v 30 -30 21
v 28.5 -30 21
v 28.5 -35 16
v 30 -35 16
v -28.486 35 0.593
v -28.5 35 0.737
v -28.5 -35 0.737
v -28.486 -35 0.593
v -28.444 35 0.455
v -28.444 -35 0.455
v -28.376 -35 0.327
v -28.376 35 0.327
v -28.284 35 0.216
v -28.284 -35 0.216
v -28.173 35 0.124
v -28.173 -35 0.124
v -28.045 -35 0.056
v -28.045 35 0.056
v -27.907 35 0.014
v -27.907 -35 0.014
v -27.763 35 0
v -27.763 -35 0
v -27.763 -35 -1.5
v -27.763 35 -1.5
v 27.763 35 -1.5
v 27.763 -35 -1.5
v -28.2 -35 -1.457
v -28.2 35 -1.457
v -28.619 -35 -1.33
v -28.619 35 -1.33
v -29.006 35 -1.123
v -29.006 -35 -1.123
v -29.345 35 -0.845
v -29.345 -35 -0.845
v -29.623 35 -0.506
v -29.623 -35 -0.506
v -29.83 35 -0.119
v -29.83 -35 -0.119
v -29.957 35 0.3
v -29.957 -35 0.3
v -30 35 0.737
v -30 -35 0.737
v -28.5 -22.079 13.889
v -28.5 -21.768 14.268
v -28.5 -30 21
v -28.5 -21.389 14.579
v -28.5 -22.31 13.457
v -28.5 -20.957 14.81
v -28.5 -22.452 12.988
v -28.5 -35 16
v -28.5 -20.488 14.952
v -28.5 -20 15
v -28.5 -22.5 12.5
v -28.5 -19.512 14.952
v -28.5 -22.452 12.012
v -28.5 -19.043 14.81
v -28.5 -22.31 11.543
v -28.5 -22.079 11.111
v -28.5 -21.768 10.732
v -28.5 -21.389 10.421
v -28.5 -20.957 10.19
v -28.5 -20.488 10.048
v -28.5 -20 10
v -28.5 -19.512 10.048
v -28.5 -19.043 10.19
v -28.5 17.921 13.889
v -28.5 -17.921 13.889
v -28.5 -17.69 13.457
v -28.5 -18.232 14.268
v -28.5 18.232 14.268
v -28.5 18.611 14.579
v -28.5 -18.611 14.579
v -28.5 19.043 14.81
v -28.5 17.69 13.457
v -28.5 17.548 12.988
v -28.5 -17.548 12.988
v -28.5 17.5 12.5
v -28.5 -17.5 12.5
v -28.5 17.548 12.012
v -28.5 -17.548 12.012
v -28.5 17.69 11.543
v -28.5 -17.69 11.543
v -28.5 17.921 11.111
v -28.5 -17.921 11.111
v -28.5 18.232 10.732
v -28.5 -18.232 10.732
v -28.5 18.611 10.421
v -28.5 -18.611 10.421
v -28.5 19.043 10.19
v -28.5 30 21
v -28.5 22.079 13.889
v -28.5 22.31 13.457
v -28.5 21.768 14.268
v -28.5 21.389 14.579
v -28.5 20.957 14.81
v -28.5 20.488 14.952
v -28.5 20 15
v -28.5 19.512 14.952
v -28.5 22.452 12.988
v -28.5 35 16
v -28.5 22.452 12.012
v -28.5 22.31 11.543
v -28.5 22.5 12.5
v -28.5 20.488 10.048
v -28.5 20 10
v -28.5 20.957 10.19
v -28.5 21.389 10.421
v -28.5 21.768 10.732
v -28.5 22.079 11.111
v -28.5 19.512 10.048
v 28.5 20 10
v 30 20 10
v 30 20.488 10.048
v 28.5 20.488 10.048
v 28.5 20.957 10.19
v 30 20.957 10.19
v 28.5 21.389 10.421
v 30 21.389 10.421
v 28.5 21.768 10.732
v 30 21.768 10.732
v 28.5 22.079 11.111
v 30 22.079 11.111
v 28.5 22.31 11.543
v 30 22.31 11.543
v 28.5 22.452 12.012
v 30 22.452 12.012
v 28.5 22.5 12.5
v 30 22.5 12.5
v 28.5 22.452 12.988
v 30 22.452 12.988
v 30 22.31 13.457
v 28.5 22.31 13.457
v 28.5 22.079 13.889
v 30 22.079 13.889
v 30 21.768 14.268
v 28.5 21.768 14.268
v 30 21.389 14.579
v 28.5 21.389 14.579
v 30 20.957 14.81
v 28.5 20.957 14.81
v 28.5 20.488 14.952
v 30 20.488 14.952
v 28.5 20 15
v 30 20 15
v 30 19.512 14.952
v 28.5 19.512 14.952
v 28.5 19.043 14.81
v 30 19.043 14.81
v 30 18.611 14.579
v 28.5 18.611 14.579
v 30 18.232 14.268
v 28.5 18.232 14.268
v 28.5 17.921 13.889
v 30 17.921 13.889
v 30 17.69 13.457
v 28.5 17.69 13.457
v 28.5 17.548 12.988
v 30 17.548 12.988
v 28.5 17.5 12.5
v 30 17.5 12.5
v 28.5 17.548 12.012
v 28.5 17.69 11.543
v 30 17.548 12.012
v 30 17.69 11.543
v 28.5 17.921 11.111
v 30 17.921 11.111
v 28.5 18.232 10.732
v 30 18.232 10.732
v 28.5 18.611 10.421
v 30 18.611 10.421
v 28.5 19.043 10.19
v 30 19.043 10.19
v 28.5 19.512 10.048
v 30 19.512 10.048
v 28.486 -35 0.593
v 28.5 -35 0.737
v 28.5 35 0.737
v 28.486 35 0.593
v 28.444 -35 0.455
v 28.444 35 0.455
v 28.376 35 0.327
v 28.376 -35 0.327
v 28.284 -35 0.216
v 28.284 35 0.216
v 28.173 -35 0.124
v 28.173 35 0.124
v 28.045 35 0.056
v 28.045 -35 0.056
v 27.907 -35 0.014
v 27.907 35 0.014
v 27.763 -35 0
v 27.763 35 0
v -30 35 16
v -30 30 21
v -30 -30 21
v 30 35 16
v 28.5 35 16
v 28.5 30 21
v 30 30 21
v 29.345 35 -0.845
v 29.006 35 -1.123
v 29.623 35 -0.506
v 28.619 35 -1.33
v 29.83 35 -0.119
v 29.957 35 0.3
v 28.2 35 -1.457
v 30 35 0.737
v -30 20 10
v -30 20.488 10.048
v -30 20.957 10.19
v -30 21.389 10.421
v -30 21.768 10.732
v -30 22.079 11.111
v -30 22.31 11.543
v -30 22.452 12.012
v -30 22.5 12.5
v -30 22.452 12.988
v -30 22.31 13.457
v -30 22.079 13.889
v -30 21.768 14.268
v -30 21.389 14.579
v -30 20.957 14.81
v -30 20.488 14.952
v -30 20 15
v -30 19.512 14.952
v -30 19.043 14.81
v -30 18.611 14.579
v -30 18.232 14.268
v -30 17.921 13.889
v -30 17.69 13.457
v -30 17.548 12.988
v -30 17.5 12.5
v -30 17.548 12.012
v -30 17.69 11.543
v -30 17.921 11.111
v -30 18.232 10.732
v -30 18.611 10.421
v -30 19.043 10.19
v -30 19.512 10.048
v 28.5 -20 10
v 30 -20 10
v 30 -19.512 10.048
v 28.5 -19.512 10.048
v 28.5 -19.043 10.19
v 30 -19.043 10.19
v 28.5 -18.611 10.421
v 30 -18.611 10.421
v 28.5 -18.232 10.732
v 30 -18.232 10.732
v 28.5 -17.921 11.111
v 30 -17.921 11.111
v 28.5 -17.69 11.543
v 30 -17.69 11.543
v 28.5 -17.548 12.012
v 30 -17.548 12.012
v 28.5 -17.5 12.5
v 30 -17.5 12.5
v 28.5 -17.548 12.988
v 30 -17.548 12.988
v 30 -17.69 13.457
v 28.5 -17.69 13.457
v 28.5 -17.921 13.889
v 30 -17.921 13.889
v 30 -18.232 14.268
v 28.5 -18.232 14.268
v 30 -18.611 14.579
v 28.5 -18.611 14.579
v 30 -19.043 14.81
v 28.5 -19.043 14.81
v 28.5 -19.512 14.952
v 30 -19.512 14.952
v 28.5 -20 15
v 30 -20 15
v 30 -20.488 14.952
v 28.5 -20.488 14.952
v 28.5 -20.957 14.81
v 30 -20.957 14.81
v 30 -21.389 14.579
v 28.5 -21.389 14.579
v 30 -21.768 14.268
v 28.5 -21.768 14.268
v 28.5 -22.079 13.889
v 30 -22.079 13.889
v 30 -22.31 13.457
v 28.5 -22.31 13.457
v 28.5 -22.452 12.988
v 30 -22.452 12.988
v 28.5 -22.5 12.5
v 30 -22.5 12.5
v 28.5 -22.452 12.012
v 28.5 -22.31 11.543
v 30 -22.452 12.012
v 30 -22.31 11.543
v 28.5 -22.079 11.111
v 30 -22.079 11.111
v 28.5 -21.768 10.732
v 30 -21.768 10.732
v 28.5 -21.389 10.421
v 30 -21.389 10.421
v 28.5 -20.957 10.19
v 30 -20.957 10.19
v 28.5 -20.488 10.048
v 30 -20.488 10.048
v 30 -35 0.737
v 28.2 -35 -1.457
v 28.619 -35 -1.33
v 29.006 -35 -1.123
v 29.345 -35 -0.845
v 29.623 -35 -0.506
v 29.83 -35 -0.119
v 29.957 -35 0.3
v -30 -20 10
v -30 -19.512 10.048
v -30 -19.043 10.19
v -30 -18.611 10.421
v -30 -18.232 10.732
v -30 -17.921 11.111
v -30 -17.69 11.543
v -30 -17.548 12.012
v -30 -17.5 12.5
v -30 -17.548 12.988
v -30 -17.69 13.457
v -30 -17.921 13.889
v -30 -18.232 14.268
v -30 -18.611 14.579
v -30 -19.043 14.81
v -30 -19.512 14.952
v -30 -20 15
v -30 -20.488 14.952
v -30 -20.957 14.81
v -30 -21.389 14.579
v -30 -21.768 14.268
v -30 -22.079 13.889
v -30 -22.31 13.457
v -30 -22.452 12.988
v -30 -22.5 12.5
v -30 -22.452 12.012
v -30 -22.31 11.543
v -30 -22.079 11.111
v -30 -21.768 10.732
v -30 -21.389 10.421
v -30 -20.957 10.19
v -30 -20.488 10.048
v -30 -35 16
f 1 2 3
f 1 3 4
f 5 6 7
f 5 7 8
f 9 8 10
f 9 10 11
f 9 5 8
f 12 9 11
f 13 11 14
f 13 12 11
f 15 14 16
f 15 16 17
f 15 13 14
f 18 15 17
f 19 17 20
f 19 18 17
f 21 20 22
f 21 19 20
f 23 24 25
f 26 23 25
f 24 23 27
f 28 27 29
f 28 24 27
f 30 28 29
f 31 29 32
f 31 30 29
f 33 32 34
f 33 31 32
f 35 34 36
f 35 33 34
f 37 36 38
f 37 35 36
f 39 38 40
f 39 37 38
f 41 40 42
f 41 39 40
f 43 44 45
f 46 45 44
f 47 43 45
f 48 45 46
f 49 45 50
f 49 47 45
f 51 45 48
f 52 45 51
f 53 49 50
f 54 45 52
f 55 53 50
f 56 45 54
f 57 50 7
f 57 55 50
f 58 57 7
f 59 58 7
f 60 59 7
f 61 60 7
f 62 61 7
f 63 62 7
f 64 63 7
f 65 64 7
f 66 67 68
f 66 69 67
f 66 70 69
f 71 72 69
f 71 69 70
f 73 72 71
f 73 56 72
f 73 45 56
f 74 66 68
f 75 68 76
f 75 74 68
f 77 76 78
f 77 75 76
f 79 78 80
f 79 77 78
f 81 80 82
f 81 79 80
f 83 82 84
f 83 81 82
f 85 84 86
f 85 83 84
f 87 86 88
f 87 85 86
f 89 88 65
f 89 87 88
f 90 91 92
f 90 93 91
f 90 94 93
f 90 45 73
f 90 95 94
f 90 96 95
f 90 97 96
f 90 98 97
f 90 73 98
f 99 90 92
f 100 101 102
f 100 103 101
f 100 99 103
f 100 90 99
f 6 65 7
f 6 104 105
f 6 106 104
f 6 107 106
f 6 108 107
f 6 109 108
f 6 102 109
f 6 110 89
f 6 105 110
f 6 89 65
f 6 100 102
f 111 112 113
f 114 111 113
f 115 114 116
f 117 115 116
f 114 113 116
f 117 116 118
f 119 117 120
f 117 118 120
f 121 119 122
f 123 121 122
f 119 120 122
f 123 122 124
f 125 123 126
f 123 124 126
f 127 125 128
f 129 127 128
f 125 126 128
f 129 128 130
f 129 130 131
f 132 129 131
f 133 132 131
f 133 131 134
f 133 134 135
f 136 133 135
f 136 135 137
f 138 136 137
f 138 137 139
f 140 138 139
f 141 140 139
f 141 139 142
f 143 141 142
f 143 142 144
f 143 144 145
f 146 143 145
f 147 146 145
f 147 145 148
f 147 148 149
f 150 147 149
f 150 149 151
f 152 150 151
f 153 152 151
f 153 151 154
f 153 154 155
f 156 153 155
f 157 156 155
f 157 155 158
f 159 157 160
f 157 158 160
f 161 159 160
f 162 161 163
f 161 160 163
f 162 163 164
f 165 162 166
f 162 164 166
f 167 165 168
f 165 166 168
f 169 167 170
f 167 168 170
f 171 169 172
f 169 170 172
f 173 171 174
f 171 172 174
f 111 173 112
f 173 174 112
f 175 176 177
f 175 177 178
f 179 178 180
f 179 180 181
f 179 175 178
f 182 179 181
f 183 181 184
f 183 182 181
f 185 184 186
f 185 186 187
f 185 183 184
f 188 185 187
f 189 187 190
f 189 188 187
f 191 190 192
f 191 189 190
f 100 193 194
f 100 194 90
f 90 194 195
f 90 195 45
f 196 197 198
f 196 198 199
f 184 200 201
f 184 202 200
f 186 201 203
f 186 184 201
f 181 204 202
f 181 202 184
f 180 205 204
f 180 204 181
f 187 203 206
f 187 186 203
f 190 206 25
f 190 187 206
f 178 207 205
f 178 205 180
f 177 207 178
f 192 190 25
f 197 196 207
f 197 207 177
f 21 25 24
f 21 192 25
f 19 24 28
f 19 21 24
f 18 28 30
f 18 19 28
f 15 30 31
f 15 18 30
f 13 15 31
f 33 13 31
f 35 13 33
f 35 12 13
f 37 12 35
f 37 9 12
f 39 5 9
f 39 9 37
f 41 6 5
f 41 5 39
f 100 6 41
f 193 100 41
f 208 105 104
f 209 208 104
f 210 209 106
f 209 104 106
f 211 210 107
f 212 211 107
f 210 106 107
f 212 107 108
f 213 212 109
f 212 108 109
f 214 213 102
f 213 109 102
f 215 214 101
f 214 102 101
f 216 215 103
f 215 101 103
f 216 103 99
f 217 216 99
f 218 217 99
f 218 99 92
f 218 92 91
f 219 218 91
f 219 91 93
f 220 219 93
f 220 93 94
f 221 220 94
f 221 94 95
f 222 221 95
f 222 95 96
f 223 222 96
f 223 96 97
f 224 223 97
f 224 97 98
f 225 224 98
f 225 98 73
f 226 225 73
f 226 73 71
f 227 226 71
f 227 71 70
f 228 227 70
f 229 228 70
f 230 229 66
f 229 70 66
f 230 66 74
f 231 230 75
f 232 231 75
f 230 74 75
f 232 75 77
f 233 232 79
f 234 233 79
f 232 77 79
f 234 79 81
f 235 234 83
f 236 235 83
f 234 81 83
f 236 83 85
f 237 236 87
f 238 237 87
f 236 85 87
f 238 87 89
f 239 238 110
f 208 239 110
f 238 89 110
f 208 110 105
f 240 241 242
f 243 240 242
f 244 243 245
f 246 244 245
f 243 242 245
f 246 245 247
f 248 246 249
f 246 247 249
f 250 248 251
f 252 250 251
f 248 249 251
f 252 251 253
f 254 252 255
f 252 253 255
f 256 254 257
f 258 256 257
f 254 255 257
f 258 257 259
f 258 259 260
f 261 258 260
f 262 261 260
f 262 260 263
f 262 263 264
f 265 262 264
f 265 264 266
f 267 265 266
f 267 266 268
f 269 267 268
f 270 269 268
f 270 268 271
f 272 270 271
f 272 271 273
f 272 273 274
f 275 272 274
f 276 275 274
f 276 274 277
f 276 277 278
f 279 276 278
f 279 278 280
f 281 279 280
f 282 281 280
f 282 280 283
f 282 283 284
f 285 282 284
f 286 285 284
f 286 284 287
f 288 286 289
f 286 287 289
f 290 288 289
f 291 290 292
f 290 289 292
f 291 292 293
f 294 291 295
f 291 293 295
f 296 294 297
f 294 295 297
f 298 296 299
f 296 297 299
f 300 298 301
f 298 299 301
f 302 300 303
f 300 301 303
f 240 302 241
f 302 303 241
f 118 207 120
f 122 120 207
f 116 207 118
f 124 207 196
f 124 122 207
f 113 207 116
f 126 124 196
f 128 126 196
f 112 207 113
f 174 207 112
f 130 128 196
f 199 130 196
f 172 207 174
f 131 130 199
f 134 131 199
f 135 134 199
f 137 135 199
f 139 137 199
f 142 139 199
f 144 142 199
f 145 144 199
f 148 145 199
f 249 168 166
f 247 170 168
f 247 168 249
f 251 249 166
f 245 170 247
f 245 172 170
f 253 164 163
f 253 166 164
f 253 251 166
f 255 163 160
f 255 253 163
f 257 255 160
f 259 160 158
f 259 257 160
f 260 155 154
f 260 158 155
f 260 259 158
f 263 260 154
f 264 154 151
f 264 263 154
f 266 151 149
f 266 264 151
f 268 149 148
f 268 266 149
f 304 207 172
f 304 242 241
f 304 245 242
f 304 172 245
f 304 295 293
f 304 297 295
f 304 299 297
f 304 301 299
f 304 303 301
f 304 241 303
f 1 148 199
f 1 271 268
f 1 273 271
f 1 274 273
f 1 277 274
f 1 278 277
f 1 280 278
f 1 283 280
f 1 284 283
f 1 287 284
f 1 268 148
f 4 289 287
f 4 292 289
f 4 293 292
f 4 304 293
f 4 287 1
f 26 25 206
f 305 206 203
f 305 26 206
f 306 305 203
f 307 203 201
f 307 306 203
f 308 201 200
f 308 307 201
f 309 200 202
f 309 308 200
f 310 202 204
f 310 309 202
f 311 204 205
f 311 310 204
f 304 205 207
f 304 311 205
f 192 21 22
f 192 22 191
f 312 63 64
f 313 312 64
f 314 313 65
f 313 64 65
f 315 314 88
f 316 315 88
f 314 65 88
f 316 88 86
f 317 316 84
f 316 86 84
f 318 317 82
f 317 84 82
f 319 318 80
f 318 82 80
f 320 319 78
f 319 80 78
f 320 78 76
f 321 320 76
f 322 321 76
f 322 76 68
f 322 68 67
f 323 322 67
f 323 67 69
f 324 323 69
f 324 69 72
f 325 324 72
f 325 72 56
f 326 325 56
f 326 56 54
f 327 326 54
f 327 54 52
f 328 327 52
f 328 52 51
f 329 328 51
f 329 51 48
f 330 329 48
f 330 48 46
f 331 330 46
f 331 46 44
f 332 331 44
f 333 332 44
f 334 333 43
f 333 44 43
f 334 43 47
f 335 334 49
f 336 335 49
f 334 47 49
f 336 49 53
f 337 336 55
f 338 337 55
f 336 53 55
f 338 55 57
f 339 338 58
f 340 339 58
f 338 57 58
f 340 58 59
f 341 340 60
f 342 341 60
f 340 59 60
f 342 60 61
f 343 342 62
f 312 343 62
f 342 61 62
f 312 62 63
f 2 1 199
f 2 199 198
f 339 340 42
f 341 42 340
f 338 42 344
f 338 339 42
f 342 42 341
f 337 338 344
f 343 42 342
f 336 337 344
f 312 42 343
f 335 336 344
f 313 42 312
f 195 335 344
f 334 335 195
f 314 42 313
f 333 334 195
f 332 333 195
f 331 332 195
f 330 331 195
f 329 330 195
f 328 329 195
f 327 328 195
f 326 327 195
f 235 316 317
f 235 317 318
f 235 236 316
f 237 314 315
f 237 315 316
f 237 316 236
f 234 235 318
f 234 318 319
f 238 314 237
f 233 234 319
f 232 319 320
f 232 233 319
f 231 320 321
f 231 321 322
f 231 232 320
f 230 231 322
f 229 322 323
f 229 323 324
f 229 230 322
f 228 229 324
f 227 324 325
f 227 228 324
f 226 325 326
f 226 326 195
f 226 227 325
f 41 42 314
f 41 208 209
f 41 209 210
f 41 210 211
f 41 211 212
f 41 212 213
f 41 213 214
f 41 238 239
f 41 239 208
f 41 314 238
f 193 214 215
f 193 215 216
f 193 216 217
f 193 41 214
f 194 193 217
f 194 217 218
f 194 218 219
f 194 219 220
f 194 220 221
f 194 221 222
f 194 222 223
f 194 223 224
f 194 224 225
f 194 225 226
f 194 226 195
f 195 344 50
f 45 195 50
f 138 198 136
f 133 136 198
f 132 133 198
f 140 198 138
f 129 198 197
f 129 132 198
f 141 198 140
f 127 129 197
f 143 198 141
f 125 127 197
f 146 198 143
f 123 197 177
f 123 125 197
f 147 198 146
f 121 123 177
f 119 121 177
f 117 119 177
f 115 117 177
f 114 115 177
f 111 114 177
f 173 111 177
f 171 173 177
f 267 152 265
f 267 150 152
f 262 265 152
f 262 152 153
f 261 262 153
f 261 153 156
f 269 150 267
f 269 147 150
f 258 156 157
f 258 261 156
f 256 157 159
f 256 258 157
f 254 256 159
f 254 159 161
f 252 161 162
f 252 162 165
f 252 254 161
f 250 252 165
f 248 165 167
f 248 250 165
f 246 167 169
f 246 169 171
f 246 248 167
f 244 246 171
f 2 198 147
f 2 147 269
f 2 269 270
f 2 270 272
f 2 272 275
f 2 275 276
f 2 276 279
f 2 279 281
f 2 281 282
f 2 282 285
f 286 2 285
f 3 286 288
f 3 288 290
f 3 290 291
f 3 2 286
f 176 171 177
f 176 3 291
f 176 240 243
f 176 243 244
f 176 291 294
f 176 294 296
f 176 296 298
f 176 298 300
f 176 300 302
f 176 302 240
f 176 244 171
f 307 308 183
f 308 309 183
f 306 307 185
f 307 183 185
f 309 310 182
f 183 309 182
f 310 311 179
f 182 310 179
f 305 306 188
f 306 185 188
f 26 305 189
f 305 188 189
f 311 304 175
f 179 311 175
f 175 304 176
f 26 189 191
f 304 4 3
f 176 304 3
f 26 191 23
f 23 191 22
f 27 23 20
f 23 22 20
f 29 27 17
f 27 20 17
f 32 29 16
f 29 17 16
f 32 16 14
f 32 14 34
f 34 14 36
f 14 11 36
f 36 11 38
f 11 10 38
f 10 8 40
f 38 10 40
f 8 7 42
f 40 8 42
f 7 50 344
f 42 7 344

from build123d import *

# Parameters (mm, degrees)
CROQUIS1_W                         = 60
CROQUIS1_H                         = 70
BRIDA_BASE1_DEPTH                  = 1.5
BRIDA_DE_ARISTA1_STRIP_W           = 7.4732
BRIDA_DE_ARISTA1_STRIP_H           = 1.5
BRIDA_DE_ARISTA1_STRIP_CUT_DEPTH   = 70
BRIDA_DE_ARISTA1_STRIP_2_W         = 7.4732
BRIDA_DE_ARISTA1_STRIP_2_H         = 1.5
BRIDA_DE_ARISTA1_STRIP_CUT_2_DEPTH = 70
BRIDA_DE_ARISTA1_DEPTH             = 70
BRIDA_DE_ARISTA1_BEND_DEPTH        = 70
ROMPER_START                       = 36.062445841
ROMPER_ESQUINA1_OUTLINE_W          = 64
ROMPER_ESQUINA1_OUTLINE_H          = 51.062445841
ROMPER_ESQUINA1_DEPTH              = 3.535533905
ROMPER_START_2                     = -13.435028843
ROMPER_ESQUINA1_2_OUTLINE_W        = 64
ROMPER_ESQUINA1_2_OUTLINE_H        = 3.937554159
ROMPER_ESQUINA1_2_DEPTH            = 7.071067812
CROQUIS13_R                        = 2.5
CORTAR_EXTRUIR1_DEPTH              = 73.567210226


# Read off the part's stored shape, not the designer's step: Romper esquina1
# Sheet-metal steps are written as plain solids
with BuildPart() as part:
    # Croquis1 → Brida base1 (new body)
    with BuildSketch(Plane.XY):
        Rectangle(CROQUIS1_W, CROQUIS1_H)
    extrude(amount=-BRIDA_BASE1_DEPTH)

    # Brida de arista1 strip (across the edge) → Brida de arista1 strip cut (cut)
    with BuildSketch(Plane(origin=(30, -35, 0), x_dir=(-1, 0, 0), z_dir=(0, 1, 0))):
        with Locations((-1.5, -0.75)):
            Rectangle(BRIDA_DE_ARISTA1_STRIP_W, BRIDA_DE_ARISTA1_STRIP_H)
    extrude(amount=BRIDA_DE_ARISTA1_STRIP_CUT_DEPTH, mode=Mode.SUBTRACT)

    # Brida de arista1 strip 2 (across the edge) → Brida de arista1 strip cut 2 (cut)
    with BuildSketch(Plane(origin=(-30, 35, 0), x_dir=(1, 0, 0), z_dir=(0, -1, 0))):
        with Locations((-1.5, -0.75)):
            Rectangle(BRIDA_DE_ARISTA1_STRIP_2_W, BRIDA_DE_ARISTA1_STRIP_2_H)
    extrude(amount=BRIDA_DE_ARISTA1_STRIP_CUT_2_DEPTH, mode=Mode.SUBTRACT)

    # Brida de arista1 section (across the edge) → Brida de arista1 (add)
    with BuildSketch(Plane(origin=(30, -35, 0), x_dir=(-1, 0, 0), z_dir=(0, 1, 0))):
        with BuildLine():
            Line((0, 0.7366), (0, 21))
            Line((0, 21), (1.5, 21))
            Line((1.5, 21), (1.5, 0.7366))
            ThreePointArc((1.5, 0.7366), (1.715745145, 0.215745145), (2.2366, 0))
            Line((2.2366, 0), (2.2366, -1.5))
            ThreePointArc((2.2366, -1.5), (0.655084973, -0.844915027), (0, 0.7366))
        make_face()
    extrude(amount=BRIDA_DE_ARISTA1_DEPTH)

    # Brida de arista1 section 2 (across the edge) → Brida de arista1 bend (add)
    with BuildSketch(Plane(origin=(-30, 35, 0), x_dir=(1, 0, 0), z_dir=(0, -1, 0))):
        with BuildLine():
            Line((0, 0.7366), (0, 21))
            Line((0, 21), (1.5, 21))
            Line((1.5, 21), (1.5, 0.7366))
            ThreePointArc((1.5, 0.7366), (1.715745145, 0.215745145), (2.2366, 0))
            Line((2.2366, 0), (2.2366, -1.5))
            ThreePointArc((2.2366, -1.5), (0.655084973, -0.844915027), (0, 0.7366))
        make_face()
    extrude(amount=BRIDA_DE_ARISTA1_BEND_DEPTH)

    # Romper esquina1 outline → Romper esquina1 (cut)
    with BuildSketch(Plane(origin=(0, 0, 0), x_dir=(1, 0, 0), z_dir=(0, 0.707106781186548, 0.707106781186547)).offset(ROMPER_START)):
        with Locations((0, -10.53122292)):
            Rectangle(ROMPER_ESQUINA1_OUTLINE_W, ROMPER_ESQUINA1_OUTLINE_H)
    extrude(amount=ROMPER_ESQUINA1_DEPTH, mode=Mode.SUBTRACT)

    # Romper esquina1 2 outline → Romper esquina1 2 (cut)
    with BuildSketch(Plane(origin=(0, 0, 0), x_dir=(1, 0, 0), z_dir=(0, 0.707106781186548, 0.707106781186547)).offset(ROMPER_START_2)):
        with Locations((0, -38.03122292)):
            Rectangle(ROMPER_ESQUINA1_2_OUTLINE_W, ROMPER_ESQUINA1_2_OUTLINE_H)
    extrude(amount=ROMPER_ESQUINA1_2_DEPTH, mode=Mode.SUBTRACT)

    # Croquis13 → Cortar-Extruir1 (cut, through all)
    with BuildSketch(Plane(origin=(30, 0, 0), x_dir=(0, 0, -1), z_dir=(1, 0, 0))):
        with Locations((-12.5, 20)):
            Circle(CROQUIS13_R)
        with Locations((-12.5, -20)):
            Circle(CROQUIS13_R)
    extrude(amount=-CORTAR_EXTRUIR1_DEPTH, mode=Mode.SUBTRACT)


solid = part.part
